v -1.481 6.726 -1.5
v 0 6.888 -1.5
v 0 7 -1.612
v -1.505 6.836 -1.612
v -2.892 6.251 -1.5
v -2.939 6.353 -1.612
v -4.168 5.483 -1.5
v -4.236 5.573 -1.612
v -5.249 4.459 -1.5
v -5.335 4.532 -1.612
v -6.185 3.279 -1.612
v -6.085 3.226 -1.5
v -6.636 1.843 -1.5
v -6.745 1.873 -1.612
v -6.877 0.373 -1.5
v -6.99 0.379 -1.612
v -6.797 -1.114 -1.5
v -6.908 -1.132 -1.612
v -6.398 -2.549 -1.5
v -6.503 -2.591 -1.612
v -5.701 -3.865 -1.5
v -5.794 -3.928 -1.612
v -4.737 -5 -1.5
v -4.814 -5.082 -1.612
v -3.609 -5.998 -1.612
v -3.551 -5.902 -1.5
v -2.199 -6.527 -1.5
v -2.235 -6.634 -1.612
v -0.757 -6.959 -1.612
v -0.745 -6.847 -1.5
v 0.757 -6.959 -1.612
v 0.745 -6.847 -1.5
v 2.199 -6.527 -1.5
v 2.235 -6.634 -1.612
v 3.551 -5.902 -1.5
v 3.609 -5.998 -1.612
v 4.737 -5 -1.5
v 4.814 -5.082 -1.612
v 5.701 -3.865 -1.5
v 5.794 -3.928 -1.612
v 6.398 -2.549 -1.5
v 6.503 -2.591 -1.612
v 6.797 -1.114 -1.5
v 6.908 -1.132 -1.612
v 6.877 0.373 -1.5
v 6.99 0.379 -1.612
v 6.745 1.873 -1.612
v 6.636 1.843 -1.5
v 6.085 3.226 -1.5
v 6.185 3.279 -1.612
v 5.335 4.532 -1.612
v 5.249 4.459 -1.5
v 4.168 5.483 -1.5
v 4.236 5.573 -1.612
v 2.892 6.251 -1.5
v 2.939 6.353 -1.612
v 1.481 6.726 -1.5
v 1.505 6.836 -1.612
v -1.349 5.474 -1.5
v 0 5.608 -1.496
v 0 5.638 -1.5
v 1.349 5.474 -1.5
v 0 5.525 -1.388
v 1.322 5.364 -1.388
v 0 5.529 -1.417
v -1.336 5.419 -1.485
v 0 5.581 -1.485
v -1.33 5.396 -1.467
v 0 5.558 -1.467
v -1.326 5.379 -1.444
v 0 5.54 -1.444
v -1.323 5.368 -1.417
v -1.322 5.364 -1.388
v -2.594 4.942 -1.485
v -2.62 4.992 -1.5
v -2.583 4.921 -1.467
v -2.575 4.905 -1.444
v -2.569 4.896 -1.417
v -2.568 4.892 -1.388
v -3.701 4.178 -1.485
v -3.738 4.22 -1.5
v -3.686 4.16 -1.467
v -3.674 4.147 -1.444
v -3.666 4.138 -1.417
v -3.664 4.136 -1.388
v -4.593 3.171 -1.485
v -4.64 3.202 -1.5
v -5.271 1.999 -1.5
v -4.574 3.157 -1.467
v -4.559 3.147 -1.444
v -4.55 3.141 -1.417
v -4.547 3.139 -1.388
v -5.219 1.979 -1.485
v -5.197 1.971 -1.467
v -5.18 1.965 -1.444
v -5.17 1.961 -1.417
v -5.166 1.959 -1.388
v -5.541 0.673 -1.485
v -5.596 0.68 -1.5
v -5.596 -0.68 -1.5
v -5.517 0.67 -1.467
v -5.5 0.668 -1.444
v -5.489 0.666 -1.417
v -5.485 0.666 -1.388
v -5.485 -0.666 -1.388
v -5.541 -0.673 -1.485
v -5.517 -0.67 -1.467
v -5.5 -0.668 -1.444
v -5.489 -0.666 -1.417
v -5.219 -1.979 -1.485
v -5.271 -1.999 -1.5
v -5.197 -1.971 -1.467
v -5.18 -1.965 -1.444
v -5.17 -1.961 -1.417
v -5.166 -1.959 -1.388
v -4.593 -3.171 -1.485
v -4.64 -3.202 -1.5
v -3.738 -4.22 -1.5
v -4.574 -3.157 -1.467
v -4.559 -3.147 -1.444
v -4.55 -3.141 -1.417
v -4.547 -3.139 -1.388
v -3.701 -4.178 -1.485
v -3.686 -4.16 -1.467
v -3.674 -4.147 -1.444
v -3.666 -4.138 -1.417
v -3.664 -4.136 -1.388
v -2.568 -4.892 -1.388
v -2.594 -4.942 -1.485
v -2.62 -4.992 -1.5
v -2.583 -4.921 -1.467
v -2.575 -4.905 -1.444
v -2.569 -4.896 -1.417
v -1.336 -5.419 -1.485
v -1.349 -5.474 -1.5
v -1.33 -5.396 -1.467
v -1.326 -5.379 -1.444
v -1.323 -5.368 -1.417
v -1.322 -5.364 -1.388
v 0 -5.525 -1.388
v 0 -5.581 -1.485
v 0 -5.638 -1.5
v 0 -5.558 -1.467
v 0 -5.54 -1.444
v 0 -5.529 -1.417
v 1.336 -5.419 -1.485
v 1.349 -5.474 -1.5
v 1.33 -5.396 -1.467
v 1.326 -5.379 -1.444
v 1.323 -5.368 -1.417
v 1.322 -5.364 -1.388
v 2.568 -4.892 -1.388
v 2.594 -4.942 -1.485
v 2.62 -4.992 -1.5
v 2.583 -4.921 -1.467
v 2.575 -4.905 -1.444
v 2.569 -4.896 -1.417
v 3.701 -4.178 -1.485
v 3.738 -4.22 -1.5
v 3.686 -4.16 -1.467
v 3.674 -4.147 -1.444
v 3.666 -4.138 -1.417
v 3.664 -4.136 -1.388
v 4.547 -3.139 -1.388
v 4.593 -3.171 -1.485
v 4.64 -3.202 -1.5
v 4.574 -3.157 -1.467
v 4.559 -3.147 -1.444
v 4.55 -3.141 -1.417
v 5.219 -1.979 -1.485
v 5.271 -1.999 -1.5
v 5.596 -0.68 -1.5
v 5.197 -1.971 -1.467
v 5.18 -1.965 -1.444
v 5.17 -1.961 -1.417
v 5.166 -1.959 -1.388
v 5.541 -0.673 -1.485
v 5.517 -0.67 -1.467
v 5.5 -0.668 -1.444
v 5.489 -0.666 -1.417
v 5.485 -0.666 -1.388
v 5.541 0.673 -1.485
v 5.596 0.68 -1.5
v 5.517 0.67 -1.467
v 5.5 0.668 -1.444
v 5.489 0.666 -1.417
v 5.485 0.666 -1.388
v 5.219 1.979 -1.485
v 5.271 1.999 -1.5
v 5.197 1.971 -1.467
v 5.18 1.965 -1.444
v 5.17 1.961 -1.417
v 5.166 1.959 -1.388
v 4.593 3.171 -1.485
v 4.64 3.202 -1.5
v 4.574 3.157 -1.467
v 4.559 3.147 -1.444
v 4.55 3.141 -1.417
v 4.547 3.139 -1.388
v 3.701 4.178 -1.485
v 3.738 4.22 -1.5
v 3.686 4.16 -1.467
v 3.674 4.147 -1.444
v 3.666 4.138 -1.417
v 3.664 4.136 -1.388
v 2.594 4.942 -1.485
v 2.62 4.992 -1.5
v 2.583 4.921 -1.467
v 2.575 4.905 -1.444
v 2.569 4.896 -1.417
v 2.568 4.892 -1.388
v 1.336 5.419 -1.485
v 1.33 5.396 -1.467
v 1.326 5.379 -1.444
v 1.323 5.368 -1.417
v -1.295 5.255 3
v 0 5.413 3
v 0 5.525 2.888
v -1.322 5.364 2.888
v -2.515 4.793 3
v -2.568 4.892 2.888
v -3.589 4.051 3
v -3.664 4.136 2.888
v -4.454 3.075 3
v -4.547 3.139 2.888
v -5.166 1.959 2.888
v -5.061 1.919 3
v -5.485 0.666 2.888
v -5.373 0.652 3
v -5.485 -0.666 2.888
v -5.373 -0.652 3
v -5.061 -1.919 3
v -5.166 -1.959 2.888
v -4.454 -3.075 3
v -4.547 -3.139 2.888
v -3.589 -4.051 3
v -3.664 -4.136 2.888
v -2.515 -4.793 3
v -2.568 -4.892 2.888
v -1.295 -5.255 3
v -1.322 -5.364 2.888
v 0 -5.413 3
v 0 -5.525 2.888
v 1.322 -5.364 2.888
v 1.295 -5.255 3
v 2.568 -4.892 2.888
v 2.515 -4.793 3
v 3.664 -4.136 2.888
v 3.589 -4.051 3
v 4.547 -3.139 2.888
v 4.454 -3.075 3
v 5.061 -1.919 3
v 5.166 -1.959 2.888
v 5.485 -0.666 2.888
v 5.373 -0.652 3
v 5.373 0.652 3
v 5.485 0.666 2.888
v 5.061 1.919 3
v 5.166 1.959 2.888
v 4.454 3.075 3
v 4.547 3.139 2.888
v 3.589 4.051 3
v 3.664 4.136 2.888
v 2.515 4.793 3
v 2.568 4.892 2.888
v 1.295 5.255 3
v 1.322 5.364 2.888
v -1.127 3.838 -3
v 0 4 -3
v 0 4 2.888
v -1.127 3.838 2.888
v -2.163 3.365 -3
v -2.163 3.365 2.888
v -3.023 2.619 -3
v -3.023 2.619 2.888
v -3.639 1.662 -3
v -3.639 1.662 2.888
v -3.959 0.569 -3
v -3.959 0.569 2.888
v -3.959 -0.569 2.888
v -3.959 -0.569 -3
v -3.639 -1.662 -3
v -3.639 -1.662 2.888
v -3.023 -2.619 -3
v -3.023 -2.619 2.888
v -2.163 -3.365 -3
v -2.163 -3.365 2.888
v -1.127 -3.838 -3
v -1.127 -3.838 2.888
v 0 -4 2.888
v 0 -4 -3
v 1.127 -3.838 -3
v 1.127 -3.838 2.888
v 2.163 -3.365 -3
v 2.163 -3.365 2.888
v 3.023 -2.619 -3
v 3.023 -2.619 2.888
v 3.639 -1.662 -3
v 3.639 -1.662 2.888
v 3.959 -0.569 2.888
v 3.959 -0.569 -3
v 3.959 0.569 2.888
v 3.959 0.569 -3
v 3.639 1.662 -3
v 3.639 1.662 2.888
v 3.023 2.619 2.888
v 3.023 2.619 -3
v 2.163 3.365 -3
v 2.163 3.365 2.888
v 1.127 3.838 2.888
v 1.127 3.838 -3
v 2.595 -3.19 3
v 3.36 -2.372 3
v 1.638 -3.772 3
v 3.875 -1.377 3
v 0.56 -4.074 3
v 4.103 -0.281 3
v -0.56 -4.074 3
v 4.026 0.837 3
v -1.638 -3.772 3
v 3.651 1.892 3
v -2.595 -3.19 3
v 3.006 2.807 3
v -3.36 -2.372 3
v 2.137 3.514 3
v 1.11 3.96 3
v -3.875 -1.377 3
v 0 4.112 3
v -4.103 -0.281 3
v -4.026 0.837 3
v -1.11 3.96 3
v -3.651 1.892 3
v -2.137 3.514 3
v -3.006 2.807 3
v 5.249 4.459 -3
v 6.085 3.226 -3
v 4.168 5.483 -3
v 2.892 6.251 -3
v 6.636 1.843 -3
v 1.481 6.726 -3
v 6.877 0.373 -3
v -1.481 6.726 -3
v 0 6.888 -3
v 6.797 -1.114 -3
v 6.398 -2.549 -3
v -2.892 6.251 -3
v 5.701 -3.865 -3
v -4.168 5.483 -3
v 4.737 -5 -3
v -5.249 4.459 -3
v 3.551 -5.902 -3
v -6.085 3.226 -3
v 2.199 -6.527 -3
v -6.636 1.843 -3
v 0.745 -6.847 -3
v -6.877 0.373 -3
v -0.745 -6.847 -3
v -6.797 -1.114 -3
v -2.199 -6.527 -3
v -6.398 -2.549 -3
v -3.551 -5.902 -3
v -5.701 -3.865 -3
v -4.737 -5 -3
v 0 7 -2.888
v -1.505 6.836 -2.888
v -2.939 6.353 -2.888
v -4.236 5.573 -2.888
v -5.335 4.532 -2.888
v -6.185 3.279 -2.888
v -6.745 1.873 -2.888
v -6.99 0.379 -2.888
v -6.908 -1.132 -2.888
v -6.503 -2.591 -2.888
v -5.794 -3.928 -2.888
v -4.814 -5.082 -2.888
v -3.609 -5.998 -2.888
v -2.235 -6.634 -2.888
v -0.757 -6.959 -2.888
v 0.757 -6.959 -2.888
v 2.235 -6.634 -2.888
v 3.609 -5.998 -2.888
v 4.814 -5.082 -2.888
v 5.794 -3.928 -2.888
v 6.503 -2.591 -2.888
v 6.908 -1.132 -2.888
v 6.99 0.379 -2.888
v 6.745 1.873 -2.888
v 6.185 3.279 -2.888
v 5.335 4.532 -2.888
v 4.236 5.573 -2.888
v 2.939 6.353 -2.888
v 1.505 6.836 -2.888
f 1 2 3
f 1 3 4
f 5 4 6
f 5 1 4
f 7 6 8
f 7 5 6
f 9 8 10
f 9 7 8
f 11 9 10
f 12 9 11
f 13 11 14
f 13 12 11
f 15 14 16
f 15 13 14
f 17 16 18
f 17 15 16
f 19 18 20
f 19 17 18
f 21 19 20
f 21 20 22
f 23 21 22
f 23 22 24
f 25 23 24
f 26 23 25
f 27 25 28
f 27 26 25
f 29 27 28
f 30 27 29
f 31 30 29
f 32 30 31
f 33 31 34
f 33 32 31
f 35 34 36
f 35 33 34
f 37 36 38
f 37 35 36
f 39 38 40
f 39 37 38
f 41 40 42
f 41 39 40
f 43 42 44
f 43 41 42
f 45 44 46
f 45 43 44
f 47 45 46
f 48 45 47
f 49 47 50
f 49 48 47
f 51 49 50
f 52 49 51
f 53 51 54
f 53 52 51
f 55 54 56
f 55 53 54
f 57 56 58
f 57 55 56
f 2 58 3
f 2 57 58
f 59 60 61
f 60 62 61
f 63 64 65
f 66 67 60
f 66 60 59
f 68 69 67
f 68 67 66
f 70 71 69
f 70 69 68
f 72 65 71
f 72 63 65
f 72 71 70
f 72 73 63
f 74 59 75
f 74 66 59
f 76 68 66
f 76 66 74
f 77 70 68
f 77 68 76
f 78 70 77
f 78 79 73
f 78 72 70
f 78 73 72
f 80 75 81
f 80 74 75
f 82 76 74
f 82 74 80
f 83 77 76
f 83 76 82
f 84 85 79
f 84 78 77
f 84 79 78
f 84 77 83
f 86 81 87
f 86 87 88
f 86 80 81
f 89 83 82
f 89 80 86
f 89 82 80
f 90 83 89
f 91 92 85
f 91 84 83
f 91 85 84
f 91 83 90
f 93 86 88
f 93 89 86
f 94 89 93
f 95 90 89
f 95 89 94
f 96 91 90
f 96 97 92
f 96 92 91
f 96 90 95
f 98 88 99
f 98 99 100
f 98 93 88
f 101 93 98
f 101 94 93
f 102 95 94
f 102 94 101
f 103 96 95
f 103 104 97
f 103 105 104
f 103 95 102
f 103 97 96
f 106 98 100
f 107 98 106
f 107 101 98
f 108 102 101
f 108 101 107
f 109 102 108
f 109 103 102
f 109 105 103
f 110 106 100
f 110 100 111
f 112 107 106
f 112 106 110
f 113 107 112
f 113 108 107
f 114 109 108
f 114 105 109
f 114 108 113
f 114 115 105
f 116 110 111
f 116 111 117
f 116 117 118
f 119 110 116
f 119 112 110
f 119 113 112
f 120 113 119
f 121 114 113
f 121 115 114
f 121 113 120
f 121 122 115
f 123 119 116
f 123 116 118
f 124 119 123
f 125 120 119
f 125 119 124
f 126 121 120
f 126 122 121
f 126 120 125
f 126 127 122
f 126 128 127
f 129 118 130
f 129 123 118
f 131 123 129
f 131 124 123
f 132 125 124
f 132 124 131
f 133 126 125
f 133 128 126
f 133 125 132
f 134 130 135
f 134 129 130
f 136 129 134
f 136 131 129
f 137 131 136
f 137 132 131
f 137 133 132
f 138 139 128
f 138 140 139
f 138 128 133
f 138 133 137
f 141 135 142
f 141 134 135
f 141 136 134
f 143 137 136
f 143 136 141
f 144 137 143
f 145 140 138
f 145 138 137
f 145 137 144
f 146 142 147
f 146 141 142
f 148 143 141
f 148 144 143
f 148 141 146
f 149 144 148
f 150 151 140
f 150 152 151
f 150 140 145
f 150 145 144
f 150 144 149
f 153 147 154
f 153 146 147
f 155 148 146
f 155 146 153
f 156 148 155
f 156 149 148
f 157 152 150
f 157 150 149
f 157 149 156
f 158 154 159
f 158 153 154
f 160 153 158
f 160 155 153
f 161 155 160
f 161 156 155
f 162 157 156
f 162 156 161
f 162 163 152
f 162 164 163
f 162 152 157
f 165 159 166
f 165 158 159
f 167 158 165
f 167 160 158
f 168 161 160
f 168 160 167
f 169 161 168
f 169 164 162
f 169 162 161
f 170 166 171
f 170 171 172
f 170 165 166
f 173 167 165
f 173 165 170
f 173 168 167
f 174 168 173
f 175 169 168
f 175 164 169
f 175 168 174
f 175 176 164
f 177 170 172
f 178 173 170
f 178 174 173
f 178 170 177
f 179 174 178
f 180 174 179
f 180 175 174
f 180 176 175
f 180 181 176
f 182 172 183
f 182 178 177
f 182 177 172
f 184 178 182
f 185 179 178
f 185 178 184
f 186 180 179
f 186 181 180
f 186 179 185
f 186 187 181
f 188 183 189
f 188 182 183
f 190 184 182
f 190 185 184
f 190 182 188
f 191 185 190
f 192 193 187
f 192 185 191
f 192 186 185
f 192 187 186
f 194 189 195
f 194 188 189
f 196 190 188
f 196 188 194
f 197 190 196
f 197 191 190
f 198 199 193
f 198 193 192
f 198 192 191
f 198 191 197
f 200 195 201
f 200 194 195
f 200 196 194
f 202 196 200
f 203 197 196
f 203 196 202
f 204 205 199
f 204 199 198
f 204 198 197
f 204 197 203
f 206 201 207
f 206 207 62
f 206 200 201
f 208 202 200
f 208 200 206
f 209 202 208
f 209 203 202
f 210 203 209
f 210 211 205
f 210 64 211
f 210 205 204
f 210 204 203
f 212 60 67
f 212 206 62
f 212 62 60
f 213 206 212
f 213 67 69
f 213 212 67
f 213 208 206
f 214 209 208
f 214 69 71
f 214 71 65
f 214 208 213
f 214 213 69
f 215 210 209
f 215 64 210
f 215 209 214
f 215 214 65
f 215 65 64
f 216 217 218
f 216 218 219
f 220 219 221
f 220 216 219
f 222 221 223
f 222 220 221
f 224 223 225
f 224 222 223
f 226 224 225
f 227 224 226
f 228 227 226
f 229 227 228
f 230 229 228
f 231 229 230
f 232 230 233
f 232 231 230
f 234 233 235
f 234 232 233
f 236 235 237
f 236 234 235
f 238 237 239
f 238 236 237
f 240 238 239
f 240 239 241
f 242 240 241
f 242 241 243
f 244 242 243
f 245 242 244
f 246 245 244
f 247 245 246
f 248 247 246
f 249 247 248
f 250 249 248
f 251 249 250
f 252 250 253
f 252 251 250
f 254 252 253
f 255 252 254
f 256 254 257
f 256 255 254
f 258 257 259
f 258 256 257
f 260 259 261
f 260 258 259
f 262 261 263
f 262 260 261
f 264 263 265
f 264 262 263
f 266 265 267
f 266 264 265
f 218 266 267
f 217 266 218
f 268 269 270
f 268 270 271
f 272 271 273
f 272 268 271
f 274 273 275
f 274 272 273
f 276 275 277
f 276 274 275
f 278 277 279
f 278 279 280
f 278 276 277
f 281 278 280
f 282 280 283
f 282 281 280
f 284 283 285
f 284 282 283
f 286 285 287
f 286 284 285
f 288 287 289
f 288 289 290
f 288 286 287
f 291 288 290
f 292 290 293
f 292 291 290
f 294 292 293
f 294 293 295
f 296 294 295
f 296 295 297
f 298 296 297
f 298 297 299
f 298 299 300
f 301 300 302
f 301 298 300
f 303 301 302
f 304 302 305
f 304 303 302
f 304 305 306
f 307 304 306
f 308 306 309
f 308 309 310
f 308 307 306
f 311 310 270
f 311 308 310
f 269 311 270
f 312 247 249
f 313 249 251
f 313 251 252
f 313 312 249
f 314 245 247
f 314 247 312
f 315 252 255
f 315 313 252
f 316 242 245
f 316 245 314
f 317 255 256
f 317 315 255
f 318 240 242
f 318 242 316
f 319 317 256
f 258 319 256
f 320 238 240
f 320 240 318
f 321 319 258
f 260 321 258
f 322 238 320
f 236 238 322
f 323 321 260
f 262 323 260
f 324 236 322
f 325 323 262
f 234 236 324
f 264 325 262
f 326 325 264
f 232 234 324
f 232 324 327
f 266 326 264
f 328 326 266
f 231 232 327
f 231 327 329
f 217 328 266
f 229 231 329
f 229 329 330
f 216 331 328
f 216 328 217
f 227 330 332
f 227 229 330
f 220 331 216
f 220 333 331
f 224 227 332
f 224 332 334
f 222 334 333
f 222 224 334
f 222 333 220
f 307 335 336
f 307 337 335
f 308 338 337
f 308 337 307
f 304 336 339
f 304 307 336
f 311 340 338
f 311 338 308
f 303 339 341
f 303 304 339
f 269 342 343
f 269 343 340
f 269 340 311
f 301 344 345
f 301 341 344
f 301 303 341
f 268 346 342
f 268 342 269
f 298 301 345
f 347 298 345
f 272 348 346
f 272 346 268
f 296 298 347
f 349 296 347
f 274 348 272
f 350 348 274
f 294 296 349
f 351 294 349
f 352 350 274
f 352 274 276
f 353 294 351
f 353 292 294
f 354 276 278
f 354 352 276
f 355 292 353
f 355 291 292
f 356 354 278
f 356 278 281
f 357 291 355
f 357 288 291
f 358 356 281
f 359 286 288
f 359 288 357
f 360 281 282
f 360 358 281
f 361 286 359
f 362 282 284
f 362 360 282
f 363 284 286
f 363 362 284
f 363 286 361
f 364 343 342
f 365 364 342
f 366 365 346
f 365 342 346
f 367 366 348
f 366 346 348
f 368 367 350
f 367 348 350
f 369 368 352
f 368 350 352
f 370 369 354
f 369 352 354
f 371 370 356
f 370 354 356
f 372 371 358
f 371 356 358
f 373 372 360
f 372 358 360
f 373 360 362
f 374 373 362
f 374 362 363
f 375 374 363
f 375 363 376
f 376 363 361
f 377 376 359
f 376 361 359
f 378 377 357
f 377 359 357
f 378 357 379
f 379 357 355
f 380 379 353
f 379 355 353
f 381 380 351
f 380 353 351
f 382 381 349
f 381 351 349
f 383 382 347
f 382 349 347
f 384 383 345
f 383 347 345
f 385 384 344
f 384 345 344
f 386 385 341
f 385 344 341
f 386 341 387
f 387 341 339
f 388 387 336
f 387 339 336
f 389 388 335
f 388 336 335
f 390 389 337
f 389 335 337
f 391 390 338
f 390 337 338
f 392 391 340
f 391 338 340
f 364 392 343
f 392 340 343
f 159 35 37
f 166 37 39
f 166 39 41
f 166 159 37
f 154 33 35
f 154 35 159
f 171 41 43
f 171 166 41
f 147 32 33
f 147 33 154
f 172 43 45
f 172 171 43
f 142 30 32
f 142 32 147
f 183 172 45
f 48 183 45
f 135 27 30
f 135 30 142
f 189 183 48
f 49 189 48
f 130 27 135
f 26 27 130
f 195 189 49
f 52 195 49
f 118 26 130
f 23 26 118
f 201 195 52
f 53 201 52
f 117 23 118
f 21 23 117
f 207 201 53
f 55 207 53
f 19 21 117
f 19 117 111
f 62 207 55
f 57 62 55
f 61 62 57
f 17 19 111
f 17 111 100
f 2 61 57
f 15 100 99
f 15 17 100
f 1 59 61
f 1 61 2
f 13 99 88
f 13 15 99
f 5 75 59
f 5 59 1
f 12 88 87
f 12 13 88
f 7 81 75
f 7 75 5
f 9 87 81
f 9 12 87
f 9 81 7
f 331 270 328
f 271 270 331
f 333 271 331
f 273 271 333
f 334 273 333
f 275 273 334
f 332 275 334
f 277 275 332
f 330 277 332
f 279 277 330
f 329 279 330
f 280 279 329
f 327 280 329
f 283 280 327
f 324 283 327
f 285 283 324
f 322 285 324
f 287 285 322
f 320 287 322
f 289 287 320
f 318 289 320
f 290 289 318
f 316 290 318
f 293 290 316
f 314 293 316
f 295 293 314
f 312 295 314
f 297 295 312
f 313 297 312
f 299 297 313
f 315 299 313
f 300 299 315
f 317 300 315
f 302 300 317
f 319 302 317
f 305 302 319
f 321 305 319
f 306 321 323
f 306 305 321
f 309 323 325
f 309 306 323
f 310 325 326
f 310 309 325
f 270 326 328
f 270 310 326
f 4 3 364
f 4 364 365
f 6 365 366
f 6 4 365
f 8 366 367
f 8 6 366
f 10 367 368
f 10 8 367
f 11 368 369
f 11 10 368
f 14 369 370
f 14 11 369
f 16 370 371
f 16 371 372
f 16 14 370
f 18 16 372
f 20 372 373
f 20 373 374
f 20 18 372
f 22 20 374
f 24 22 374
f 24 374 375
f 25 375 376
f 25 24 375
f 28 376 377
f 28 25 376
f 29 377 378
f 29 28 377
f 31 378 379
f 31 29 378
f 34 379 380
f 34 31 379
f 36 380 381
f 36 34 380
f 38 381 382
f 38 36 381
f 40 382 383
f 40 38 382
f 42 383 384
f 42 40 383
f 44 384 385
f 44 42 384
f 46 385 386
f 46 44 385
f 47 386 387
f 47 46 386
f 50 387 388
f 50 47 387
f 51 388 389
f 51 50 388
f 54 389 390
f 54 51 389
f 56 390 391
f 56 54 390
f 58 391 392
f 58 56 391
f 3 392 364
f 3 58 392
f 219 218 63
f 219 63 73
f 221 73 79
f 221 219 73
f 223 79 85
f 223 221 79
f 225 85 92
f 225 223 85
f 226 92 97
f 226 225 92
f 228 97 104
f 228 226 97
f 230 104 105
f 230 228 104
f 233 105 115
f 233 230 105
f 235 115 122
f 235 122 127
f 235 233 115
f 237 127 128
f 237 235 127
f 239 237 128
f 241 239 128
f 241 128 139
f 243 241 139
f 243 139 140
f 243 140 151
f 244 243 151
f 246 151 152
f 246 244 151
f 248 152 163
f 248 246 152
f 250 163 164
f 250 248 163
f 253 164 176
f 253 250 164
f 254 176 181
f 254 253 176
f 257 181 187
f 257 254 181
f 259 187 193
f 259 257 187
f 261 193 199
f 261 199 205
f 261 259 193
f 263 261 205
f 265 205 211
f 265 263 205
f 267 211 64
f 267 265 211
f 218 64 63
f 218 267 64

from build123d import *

# Parameters (mm, degrees)
CHAMFER1_SIZE = 0.1125
FILLET1_R     = 0.1125


with BuildPart() as part:
    # Sketch3 → Revolve1 (revolve)
    with BuildSketch(Plane(origin=(0, 0, 0), x_dir=(0, 0, -1), z_dir=(1, 0, 0))):
        Polygon((3, 7), (1.5, 7), (1.5, 5.525), (-3, 5.525), (-3, 4), (3, 4), align=None)
    revolve(axis=Axis((0, 0, -3), (0, 0, 1)))

    # Chamfer1
    chamfer1_edges = [part.edges().sort_by_distance(p)[0] for p in [
        (0, -4, 3),
        (0, -5.525, 3),
        (0, -7, -1.5),
        (0, -7, -3),
    ]]
    chamfer(chamfer1_edges, length=CHAMFER1_SIZE)

    # Fillet1
    fillet1_edges = [part.edges().sort_by_distance(p)[0] for p in [
        (0, -5.525, -1.5),
    ]]
    fillet(fillet1_edges, radius=FILLET1_R)


solid = part.part
